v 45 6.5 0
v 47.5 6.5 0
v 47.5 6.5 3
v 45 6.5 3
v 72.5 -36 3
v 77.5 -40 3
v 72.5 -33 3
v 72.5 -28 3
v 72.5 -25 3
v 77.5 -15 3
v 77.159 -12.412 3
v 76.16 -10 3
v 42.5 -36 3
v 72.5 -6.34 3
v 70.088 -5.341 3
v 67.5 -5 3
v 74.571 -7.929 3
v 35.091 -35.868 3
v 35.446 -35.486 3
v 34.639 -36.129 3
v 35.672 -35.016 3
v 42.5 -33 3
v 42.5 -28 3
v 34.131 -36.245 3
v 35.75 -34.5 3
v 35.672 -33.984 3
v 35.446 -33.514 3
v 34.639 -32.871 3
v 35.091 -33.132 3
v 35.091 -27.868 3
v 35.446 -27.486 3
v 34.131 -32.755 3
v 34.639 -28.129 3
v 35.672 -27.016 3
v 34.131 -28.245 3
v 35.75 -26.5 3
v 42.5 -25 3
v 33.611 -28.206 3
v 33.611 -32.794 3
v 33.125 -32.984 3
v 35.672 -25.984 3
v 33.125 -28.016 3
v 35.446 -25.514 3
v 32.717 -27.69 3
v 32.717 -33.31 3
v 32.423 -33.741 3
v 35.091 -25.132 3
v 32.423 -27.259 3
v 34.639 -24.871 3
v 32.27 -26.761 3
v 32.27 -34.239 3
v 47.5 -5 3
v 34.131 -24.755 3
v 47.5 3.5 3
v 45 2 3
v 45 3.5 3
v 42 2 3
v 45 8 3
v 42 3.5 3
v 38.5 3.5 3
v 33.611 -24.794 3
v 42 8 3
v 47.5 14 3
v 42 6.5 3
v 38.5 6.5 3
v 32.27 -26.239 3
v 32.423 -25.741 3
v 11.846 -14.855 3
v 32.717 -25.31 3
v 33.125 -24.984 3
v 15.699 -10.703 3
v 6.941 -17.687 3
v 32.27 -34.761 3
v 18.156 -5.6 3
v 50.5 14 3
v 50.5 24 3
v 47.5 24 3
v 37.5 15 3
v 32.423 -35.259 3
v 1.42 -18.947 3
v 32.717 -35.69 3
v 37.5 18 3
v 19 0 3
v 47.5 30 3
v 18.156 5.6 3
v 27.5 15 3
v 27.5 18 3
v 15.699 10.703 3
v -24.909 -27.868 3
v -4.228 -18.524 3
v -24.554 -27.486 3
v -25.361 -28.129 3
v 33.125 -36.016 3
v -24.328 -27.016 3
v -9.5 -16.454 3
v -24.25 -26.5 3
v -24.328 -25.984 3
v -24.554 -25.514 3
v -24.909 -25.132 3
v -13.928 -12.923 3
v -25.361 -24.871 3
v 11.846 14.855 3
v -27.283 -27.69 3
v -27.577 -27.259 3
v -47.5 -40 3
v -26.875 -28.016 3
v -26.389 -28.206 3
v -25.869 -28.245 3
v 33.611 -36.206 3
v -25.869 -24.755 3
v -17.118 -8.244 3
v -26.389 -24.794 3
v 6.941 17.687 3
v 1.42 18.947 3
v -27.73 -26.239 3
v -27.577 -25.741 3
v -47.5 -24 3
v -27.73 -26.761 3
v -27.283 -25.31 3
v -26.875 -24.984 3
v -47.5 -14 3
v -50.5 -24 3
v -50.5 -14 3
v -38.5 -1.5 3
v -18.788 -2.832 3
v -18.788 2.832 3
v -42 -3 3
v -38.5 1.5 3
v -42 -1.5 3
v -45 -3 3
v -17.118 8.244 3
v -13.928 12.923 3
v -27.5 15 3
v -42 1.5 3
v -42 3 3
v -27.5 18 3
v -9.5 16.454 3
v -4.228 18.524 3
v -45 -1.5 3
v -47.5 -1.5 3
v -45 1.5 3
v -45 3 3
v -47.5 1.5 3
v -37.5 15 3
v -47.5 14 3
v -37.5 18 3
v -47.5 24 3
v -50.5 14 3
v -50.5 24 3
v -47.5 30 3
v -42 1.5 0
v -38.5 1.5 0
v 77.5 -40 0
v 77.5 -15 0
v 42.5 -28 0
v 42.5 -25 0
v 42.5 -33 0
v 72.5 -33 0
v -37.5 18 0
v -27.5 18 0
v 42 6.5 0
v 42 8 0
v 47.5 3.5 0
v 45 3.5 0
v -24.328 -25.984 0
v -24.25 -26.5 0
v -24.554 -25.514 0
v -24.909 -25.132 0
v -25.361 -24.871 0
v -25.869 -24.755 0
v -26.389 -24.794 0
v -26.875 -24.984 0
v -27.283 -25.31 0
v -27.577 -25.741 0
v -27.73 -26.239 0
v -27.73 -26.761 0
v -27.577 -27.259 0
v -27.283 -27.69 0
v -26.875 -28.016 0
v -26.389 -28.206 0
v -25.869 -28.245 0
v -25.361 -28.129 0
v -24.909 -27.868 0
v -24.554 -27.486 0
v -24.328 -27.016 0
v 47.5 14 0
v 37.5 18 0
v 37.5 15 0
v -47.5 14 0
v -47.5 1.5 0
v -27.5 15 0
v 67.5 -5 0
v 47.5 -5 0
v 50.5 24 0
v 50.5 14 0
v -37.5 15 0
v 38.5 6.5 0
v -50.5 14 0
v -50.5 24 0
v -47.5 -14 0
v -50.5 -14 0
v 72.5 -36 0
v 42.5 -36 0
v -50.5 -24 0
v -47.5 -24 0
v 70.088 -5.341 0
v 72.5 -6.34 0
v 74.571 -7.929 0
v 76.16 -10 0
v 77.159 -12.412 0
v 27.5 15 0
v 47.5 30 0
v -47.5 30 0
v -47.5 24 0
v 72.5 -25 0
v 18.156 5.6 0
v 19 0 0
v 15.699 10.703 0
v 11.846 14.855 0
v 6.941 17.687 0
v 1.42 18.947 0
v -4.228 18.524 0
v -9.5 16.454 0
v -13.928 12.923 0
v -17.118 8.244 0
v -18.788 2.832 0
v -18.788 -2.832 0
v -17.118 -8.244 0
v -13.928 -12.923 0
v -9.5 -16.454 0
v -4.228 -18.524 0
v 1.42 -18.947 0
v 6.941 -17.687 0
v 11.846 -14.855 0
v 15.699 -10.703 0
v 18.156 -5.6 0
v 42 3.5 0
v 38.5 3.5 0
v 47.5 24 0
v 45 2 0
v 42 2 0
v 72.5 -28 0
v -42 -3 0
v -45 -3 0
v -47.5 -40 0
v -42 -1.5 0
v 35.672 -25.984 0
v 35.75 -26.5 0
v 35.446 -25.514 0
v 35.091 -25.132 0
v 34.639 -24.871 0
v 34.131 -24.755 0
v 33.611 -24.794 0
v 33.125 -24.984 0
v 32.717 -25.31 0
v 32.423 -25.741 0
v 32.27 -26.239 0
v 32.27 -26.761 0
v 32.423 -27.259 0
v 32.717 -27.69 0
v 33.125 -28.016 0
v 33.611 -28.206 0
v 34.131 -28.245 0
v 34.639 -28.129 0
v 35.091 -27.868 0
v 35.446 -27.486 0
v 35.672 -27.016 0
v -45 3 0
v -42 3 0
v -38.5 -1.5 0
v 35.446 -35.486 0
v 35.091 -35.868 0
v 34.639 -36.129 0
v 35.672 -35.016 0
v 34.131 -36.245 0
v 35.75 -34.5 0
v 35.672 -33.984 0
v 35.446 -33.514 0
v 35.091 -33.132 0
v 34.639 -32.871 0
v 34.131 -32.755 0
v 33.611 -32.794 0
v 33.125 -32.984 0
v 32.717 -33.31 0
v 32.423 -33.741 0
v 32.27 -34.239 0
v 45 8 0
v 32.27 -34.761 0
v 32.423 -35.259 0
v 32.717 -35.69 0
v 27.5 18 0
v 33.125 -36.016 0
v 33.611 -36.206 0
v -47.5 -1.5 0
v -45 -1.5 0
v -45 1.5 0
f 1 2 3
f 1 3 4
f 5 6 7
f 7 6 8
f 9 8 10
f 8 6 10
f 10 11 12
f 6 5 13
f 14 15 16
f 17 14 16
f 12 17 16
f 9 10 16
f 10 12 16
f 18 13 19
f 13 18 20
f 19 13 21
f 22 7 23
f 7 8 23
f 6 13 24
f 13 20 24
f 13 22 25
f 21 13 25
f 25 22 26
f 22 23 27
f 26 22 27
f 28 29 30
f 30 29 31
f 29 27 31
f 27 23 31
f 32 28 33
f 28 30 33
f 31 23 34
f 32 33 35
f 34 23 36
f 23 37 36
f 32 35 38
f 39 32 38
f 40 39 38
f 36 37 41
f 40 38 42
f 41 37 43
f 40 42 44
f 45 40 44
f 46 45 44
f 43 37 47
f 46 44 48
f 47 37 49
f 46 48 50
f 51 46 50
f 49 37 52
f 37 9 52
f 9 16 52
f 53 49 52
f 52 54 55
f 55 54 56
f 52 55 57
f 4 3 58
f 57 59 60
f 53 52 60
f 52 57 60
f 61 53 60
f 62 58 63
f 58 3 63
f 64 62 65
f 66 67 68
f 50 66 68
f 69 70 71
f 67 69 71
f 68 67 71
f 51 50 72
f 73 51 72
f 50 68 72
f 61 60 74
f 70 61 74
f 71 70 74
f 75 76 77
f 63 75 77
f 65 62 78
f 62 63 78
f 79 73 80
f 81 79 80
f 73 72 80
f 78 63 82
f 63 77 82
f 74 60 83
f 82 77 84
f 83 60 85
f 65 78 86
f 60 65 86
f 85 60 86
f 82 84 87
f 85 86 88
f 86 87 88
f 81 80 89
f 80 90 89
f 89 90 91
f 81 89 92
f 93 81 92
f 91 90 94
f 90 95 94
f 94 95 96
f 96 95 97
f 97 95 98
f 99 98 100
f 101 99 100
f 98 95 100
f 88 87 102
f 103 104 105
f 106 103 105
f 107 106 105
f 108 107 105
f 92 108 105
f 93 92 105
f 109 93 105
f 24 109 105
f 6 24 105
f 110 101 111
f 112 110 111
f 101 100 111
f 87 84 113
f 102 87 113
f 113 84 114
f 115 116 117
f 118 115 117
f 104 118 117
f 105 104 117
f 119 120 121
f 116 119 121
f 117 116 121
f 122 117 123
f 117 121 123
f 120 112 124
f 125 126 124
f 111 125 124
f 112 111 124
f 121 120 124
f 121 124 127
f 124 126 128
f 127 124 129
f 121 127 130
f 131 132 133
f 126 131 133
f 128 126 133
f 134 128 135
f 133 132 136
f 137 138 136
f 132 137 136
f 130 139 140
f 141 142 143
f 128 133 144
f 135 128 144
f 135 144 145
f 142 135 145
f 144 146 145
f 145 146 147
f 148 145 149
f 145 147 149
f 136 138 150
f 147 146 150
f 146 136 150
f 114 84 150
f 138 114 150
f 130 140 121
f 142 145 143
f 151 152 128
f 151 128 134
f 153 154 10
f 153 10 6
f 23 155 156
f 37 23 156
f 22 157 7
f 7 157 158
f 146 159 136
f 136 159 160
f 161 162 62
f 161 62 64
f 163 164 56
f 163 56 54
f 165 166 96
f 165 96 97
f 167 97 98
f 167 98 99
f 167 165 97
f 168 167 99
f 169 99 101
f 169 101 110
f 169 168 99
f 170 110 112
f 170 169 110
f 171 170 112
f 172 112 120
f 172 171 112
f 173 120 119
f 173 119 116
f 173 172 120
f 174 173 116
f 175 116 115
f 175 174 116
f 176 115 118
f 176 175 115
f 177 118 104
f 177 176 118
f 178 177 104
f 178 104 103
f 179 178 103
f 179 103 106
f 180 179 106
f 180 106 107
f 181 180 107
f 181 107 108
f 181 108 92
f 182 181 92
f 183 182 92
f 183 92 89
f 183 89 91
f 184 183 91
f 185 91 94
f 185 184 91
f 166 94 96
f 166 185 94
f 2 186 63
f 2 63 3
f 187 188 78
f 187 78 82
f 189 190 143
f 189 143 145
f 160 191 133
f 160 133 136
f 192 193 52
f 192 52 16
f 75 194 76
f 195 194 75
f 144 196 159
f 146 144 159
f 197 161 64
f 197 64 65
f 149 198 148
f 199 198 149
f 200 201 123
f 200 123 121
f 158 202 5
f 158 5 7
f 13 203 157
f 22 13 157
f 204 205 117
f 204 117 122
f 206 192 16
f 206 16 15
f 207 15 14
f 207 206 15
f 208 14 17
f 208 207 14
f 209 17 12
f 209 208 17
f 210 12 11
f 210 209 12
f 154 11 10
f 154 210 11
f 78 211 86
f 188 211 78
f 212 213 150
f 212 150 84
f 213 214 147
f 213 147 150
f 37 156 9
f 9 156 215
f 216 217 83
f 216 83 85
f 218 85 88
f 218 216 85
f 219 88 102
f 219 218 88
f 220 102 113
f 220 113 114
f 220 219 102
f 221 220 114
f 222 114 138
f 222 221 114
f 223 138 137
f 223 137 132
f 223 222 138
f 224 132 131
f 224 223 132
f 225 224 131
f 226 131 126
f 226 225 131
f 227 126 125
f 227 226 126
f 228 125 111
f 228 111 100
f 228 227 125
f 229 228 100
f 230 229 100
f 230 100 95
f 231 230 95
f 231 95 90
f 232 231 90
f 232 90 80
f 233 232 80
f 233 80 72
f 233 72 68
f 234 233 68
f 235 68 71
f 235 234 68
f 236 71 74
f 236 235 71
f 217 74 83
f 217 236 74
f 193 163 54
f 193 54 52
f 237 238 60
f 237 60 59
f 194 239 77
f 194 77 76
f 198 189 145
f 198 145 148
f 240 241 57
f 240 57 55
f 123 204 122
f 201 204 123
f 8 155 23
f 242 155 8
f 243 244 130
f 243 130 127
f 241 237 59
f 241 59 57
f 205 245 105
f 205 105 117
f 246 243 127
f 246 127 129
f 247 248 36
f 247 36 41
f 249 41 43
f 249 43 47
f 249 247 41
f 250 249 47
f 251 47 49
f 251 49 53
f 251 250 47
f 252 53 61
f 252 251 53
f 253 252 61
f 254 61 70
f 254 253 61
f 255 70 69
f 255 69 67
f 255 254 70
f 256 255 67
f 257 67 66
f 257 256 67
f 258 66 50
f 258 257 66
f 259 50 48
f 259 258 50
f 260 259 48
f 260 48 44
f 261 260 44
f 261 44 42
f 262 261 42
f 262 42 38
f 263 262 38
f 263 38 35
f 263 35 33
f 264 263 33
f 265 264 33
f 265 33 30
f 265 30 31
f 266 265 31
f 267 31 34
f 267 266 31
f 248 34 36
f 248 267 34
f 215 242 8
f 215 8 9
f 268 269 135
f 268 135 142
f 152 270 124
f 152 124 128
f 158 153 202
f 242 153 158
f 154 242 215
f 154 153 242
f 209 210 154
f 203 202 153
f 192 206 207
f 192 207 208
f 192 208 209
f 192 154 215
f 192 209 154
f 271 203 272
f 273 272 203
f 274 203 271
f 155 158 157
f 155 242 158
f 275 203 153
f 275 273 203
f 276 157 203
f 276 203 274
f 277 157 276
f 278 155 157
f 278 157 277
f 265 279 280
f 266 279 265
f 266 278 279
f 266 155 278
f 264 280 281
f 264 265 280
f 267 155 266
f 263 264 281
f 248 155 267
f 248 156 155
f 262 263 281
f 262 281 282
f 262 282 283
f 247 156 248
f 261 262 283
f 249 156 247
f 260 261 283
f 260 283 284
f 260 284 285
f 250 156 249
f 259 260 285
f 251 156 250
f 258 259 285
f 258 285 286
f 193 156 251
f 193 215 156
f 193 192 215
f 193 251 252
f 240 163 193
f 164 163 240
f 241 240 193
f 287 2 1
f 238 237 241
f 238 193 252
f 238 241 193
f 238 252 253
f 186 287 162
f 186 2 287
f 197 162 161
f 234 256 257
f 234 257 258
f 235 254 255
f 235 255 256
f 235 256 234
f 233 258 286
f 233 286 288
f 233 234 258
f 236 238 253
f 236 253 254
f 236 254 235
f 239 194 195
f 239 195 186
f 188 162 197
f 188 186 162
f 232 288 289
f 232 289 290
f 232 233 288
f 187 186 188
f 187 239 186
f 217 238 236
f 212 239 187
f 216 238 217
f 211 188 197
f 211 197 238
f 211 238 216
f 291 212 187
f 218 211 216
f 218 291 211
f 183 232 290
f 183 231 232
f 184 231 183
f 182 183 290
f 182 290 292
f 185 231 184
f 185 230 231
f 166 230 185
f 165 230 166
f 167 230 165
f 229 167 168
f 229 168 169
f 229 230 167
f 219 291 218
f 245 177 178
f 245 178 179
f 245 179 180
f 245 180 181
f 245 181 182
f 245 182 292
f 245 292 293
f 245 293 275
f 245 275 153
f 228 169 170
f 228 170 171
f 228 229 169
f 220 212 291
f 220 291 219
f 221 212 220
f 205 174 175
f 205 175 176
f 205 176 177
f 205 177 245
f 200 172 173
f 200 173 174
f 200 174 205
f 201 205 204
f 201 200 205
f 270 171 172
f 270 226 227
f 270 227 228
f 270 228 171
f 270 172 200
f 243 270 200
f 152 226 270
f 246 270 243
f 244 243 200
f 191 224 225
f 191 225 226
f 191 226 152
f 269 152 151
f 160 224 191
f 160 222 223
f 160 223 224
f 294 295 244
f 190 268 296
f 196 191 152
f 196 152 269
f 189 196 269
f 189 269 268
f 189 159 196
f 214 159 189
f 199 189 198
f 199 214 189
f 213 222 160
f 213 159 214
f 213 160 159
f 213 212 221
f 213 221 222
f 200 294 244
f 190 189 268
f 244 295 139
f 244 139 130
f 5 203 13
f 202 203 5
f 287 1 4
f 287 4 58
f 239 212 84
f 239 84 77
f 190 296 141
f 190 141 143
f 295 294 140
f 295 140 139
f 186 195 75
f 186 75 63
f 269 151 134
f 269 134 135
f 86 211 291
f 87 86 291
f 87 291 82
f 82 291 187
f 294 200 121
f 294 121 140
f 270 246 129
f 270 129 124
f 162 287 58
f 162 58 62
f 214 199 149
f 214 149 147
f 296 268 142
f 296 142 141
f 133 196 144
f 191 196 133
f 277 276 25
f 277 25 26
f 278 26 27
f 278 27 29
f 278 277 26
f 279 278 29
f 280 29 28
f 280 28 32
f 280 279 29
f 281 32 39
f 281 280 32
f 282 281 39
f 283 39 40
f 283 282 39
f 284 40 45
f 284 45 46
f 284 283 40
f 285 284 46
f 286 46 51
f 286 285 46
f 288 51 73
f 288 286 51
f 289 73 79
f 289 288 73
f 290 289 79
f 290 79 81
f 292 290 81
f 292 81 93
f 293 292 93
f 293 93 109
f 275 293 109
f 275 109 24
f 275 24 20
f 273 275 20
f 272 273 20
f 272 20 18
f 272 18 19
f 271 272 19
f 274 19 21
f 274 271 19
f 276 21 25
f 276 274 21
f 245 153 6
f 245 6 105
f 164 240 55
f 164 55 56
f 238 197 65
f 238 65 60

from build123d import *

# Parameters (mm, degrees)
SKETCH1_R           = 19
SKETCH1_R_2         = 1.75
SKETCH1_W           = 30
SKETCH1_H           = 3
SKETCH1_W_2         = 10
BOSS_EXTRUDE3_DEPTH = 3


with BuildPart() as part:
    # Sketch1 → Boss-Extrude3 (new body)
    with BuildSketch(Plane.XY):
        with BuildLine():
            Line((-47.5, 30), (47.5, 30))
            Line((47.5, 30), (47.5, 24))
            Line((47.5, 24), (50.5, 24))
            Line((50.5, 24), (50.5, 14))
            Line((50.5, 14), (47.5, 14))
            Line((47.5, 14), (47.5, 6.5))
            Line((47.5, 6.5), (45, 6.5))
            Line((45, 6.5), (45, 8))
            Line((45, 8), (42, 8))
            Line((42, 8), (42, 6.5))
            Line((42, 6.5), (38.5, 6.5))
            Line((38.5, 6.5), (38.5, 3.5))
            Line((38.5, 3.5), (42, 3.5))
            Line((42, 3.5), (42, 2))
            Line((42, 2), (45, 2))
            Line((45, 2), (45, 3.5))
            Line((45, 3.5), (47.5, 3.5))
            Line((47.5, 3.5), (47.5, -5))
            Line((47.5, -5), (67.5, -5))
            ThreePointArc((67.5, -5), (74.571067812, -7.928932188), (77.5, -15))
            Line((77.5, -15), (77.5, -30))
            Line((77.5, -30), (77.5, -40))
            Line((77.5, -40), (-47.5, -40))
            Line((-47.5, -40), (-47.5, -30))
            Line((-47.5, -30), (-47.5, -24))
            Line((-47.5, -24), (-50.5, -24))
            Line((-50.5, -24), (-50.5, -14))
            Line((-50.5, -14), (-47.5, -14))
            Line((-47.5, -14), (-47.5, -1.5))
            Line((-47.5, -1.5), (-45, -1.5))
            Line((-45, -1.5), (-45, -3))
            Line((-45, -3), (-42, -3))
            Line((-42, -3), (-42, -1.5))
            Line((-42, -1.5), (-38.5, -1.5))
            Line((-38.5, -1.5), (-38.5, 1.5))
            Line((-38.5, 1.5), (-42, 1.5))
            Line((-42, 1.5), (-42, 3))
            Line((-42, 3), (-45, 3))
            Line((-45, 3), (-45, 1.5))
            Line((-45, 1.5), (-47.5, 1.5))
            Line((-47.5, 1.5), (-47.5, 14))
            Line((-47.5, 14), (-50.5, 14))
            Line((-50.5, 14), (-50.5, 24))
            Line((-50.5, 24), (-47.5, 24))
            Line((-47.5, 24), (-47.5, 30))
        make_face()
        Circle(SKETCH1_R, mode=Mode.SUBTRACT)
        with Locations((-26, -26.5)):
            Circle(SKETCH1_R_2, mode=Mode.SUBTRACT)
        with Locations((34, -26.5)):
            Circle(SKETCH1_R_2, mode=Mode.SUBTRACT)
        with Locations((34, -34.5)):
            Circle(SKETCH1_R_2, mode=Mode.SUBTRACT)
        with Locations((57.5, -26.5)):
            Rectangle(SKETCH1_W, SKETCH1_H, mode=Mode.SUBTRACT)
        with Locations((-32.5, 16.5)):
            Rectangle(SKETCH1_W_2, SKETCH1_H, mode=Mode.SUBTRACT)
        with Locations((32.5, 16.5)):
            Rectangle(SKETCH1_W_2, SKETCH1_H, mode=Mode.SUBTRACT)
        with Locations((57.5, -34.5)):
            Rectangle(SKETCH1_W, SKETCH1_H, mode=Mode.SUBTRACT)
    extrude(amount=BOSS_EXTRUDE3_DEPTH)


solid = part.part
